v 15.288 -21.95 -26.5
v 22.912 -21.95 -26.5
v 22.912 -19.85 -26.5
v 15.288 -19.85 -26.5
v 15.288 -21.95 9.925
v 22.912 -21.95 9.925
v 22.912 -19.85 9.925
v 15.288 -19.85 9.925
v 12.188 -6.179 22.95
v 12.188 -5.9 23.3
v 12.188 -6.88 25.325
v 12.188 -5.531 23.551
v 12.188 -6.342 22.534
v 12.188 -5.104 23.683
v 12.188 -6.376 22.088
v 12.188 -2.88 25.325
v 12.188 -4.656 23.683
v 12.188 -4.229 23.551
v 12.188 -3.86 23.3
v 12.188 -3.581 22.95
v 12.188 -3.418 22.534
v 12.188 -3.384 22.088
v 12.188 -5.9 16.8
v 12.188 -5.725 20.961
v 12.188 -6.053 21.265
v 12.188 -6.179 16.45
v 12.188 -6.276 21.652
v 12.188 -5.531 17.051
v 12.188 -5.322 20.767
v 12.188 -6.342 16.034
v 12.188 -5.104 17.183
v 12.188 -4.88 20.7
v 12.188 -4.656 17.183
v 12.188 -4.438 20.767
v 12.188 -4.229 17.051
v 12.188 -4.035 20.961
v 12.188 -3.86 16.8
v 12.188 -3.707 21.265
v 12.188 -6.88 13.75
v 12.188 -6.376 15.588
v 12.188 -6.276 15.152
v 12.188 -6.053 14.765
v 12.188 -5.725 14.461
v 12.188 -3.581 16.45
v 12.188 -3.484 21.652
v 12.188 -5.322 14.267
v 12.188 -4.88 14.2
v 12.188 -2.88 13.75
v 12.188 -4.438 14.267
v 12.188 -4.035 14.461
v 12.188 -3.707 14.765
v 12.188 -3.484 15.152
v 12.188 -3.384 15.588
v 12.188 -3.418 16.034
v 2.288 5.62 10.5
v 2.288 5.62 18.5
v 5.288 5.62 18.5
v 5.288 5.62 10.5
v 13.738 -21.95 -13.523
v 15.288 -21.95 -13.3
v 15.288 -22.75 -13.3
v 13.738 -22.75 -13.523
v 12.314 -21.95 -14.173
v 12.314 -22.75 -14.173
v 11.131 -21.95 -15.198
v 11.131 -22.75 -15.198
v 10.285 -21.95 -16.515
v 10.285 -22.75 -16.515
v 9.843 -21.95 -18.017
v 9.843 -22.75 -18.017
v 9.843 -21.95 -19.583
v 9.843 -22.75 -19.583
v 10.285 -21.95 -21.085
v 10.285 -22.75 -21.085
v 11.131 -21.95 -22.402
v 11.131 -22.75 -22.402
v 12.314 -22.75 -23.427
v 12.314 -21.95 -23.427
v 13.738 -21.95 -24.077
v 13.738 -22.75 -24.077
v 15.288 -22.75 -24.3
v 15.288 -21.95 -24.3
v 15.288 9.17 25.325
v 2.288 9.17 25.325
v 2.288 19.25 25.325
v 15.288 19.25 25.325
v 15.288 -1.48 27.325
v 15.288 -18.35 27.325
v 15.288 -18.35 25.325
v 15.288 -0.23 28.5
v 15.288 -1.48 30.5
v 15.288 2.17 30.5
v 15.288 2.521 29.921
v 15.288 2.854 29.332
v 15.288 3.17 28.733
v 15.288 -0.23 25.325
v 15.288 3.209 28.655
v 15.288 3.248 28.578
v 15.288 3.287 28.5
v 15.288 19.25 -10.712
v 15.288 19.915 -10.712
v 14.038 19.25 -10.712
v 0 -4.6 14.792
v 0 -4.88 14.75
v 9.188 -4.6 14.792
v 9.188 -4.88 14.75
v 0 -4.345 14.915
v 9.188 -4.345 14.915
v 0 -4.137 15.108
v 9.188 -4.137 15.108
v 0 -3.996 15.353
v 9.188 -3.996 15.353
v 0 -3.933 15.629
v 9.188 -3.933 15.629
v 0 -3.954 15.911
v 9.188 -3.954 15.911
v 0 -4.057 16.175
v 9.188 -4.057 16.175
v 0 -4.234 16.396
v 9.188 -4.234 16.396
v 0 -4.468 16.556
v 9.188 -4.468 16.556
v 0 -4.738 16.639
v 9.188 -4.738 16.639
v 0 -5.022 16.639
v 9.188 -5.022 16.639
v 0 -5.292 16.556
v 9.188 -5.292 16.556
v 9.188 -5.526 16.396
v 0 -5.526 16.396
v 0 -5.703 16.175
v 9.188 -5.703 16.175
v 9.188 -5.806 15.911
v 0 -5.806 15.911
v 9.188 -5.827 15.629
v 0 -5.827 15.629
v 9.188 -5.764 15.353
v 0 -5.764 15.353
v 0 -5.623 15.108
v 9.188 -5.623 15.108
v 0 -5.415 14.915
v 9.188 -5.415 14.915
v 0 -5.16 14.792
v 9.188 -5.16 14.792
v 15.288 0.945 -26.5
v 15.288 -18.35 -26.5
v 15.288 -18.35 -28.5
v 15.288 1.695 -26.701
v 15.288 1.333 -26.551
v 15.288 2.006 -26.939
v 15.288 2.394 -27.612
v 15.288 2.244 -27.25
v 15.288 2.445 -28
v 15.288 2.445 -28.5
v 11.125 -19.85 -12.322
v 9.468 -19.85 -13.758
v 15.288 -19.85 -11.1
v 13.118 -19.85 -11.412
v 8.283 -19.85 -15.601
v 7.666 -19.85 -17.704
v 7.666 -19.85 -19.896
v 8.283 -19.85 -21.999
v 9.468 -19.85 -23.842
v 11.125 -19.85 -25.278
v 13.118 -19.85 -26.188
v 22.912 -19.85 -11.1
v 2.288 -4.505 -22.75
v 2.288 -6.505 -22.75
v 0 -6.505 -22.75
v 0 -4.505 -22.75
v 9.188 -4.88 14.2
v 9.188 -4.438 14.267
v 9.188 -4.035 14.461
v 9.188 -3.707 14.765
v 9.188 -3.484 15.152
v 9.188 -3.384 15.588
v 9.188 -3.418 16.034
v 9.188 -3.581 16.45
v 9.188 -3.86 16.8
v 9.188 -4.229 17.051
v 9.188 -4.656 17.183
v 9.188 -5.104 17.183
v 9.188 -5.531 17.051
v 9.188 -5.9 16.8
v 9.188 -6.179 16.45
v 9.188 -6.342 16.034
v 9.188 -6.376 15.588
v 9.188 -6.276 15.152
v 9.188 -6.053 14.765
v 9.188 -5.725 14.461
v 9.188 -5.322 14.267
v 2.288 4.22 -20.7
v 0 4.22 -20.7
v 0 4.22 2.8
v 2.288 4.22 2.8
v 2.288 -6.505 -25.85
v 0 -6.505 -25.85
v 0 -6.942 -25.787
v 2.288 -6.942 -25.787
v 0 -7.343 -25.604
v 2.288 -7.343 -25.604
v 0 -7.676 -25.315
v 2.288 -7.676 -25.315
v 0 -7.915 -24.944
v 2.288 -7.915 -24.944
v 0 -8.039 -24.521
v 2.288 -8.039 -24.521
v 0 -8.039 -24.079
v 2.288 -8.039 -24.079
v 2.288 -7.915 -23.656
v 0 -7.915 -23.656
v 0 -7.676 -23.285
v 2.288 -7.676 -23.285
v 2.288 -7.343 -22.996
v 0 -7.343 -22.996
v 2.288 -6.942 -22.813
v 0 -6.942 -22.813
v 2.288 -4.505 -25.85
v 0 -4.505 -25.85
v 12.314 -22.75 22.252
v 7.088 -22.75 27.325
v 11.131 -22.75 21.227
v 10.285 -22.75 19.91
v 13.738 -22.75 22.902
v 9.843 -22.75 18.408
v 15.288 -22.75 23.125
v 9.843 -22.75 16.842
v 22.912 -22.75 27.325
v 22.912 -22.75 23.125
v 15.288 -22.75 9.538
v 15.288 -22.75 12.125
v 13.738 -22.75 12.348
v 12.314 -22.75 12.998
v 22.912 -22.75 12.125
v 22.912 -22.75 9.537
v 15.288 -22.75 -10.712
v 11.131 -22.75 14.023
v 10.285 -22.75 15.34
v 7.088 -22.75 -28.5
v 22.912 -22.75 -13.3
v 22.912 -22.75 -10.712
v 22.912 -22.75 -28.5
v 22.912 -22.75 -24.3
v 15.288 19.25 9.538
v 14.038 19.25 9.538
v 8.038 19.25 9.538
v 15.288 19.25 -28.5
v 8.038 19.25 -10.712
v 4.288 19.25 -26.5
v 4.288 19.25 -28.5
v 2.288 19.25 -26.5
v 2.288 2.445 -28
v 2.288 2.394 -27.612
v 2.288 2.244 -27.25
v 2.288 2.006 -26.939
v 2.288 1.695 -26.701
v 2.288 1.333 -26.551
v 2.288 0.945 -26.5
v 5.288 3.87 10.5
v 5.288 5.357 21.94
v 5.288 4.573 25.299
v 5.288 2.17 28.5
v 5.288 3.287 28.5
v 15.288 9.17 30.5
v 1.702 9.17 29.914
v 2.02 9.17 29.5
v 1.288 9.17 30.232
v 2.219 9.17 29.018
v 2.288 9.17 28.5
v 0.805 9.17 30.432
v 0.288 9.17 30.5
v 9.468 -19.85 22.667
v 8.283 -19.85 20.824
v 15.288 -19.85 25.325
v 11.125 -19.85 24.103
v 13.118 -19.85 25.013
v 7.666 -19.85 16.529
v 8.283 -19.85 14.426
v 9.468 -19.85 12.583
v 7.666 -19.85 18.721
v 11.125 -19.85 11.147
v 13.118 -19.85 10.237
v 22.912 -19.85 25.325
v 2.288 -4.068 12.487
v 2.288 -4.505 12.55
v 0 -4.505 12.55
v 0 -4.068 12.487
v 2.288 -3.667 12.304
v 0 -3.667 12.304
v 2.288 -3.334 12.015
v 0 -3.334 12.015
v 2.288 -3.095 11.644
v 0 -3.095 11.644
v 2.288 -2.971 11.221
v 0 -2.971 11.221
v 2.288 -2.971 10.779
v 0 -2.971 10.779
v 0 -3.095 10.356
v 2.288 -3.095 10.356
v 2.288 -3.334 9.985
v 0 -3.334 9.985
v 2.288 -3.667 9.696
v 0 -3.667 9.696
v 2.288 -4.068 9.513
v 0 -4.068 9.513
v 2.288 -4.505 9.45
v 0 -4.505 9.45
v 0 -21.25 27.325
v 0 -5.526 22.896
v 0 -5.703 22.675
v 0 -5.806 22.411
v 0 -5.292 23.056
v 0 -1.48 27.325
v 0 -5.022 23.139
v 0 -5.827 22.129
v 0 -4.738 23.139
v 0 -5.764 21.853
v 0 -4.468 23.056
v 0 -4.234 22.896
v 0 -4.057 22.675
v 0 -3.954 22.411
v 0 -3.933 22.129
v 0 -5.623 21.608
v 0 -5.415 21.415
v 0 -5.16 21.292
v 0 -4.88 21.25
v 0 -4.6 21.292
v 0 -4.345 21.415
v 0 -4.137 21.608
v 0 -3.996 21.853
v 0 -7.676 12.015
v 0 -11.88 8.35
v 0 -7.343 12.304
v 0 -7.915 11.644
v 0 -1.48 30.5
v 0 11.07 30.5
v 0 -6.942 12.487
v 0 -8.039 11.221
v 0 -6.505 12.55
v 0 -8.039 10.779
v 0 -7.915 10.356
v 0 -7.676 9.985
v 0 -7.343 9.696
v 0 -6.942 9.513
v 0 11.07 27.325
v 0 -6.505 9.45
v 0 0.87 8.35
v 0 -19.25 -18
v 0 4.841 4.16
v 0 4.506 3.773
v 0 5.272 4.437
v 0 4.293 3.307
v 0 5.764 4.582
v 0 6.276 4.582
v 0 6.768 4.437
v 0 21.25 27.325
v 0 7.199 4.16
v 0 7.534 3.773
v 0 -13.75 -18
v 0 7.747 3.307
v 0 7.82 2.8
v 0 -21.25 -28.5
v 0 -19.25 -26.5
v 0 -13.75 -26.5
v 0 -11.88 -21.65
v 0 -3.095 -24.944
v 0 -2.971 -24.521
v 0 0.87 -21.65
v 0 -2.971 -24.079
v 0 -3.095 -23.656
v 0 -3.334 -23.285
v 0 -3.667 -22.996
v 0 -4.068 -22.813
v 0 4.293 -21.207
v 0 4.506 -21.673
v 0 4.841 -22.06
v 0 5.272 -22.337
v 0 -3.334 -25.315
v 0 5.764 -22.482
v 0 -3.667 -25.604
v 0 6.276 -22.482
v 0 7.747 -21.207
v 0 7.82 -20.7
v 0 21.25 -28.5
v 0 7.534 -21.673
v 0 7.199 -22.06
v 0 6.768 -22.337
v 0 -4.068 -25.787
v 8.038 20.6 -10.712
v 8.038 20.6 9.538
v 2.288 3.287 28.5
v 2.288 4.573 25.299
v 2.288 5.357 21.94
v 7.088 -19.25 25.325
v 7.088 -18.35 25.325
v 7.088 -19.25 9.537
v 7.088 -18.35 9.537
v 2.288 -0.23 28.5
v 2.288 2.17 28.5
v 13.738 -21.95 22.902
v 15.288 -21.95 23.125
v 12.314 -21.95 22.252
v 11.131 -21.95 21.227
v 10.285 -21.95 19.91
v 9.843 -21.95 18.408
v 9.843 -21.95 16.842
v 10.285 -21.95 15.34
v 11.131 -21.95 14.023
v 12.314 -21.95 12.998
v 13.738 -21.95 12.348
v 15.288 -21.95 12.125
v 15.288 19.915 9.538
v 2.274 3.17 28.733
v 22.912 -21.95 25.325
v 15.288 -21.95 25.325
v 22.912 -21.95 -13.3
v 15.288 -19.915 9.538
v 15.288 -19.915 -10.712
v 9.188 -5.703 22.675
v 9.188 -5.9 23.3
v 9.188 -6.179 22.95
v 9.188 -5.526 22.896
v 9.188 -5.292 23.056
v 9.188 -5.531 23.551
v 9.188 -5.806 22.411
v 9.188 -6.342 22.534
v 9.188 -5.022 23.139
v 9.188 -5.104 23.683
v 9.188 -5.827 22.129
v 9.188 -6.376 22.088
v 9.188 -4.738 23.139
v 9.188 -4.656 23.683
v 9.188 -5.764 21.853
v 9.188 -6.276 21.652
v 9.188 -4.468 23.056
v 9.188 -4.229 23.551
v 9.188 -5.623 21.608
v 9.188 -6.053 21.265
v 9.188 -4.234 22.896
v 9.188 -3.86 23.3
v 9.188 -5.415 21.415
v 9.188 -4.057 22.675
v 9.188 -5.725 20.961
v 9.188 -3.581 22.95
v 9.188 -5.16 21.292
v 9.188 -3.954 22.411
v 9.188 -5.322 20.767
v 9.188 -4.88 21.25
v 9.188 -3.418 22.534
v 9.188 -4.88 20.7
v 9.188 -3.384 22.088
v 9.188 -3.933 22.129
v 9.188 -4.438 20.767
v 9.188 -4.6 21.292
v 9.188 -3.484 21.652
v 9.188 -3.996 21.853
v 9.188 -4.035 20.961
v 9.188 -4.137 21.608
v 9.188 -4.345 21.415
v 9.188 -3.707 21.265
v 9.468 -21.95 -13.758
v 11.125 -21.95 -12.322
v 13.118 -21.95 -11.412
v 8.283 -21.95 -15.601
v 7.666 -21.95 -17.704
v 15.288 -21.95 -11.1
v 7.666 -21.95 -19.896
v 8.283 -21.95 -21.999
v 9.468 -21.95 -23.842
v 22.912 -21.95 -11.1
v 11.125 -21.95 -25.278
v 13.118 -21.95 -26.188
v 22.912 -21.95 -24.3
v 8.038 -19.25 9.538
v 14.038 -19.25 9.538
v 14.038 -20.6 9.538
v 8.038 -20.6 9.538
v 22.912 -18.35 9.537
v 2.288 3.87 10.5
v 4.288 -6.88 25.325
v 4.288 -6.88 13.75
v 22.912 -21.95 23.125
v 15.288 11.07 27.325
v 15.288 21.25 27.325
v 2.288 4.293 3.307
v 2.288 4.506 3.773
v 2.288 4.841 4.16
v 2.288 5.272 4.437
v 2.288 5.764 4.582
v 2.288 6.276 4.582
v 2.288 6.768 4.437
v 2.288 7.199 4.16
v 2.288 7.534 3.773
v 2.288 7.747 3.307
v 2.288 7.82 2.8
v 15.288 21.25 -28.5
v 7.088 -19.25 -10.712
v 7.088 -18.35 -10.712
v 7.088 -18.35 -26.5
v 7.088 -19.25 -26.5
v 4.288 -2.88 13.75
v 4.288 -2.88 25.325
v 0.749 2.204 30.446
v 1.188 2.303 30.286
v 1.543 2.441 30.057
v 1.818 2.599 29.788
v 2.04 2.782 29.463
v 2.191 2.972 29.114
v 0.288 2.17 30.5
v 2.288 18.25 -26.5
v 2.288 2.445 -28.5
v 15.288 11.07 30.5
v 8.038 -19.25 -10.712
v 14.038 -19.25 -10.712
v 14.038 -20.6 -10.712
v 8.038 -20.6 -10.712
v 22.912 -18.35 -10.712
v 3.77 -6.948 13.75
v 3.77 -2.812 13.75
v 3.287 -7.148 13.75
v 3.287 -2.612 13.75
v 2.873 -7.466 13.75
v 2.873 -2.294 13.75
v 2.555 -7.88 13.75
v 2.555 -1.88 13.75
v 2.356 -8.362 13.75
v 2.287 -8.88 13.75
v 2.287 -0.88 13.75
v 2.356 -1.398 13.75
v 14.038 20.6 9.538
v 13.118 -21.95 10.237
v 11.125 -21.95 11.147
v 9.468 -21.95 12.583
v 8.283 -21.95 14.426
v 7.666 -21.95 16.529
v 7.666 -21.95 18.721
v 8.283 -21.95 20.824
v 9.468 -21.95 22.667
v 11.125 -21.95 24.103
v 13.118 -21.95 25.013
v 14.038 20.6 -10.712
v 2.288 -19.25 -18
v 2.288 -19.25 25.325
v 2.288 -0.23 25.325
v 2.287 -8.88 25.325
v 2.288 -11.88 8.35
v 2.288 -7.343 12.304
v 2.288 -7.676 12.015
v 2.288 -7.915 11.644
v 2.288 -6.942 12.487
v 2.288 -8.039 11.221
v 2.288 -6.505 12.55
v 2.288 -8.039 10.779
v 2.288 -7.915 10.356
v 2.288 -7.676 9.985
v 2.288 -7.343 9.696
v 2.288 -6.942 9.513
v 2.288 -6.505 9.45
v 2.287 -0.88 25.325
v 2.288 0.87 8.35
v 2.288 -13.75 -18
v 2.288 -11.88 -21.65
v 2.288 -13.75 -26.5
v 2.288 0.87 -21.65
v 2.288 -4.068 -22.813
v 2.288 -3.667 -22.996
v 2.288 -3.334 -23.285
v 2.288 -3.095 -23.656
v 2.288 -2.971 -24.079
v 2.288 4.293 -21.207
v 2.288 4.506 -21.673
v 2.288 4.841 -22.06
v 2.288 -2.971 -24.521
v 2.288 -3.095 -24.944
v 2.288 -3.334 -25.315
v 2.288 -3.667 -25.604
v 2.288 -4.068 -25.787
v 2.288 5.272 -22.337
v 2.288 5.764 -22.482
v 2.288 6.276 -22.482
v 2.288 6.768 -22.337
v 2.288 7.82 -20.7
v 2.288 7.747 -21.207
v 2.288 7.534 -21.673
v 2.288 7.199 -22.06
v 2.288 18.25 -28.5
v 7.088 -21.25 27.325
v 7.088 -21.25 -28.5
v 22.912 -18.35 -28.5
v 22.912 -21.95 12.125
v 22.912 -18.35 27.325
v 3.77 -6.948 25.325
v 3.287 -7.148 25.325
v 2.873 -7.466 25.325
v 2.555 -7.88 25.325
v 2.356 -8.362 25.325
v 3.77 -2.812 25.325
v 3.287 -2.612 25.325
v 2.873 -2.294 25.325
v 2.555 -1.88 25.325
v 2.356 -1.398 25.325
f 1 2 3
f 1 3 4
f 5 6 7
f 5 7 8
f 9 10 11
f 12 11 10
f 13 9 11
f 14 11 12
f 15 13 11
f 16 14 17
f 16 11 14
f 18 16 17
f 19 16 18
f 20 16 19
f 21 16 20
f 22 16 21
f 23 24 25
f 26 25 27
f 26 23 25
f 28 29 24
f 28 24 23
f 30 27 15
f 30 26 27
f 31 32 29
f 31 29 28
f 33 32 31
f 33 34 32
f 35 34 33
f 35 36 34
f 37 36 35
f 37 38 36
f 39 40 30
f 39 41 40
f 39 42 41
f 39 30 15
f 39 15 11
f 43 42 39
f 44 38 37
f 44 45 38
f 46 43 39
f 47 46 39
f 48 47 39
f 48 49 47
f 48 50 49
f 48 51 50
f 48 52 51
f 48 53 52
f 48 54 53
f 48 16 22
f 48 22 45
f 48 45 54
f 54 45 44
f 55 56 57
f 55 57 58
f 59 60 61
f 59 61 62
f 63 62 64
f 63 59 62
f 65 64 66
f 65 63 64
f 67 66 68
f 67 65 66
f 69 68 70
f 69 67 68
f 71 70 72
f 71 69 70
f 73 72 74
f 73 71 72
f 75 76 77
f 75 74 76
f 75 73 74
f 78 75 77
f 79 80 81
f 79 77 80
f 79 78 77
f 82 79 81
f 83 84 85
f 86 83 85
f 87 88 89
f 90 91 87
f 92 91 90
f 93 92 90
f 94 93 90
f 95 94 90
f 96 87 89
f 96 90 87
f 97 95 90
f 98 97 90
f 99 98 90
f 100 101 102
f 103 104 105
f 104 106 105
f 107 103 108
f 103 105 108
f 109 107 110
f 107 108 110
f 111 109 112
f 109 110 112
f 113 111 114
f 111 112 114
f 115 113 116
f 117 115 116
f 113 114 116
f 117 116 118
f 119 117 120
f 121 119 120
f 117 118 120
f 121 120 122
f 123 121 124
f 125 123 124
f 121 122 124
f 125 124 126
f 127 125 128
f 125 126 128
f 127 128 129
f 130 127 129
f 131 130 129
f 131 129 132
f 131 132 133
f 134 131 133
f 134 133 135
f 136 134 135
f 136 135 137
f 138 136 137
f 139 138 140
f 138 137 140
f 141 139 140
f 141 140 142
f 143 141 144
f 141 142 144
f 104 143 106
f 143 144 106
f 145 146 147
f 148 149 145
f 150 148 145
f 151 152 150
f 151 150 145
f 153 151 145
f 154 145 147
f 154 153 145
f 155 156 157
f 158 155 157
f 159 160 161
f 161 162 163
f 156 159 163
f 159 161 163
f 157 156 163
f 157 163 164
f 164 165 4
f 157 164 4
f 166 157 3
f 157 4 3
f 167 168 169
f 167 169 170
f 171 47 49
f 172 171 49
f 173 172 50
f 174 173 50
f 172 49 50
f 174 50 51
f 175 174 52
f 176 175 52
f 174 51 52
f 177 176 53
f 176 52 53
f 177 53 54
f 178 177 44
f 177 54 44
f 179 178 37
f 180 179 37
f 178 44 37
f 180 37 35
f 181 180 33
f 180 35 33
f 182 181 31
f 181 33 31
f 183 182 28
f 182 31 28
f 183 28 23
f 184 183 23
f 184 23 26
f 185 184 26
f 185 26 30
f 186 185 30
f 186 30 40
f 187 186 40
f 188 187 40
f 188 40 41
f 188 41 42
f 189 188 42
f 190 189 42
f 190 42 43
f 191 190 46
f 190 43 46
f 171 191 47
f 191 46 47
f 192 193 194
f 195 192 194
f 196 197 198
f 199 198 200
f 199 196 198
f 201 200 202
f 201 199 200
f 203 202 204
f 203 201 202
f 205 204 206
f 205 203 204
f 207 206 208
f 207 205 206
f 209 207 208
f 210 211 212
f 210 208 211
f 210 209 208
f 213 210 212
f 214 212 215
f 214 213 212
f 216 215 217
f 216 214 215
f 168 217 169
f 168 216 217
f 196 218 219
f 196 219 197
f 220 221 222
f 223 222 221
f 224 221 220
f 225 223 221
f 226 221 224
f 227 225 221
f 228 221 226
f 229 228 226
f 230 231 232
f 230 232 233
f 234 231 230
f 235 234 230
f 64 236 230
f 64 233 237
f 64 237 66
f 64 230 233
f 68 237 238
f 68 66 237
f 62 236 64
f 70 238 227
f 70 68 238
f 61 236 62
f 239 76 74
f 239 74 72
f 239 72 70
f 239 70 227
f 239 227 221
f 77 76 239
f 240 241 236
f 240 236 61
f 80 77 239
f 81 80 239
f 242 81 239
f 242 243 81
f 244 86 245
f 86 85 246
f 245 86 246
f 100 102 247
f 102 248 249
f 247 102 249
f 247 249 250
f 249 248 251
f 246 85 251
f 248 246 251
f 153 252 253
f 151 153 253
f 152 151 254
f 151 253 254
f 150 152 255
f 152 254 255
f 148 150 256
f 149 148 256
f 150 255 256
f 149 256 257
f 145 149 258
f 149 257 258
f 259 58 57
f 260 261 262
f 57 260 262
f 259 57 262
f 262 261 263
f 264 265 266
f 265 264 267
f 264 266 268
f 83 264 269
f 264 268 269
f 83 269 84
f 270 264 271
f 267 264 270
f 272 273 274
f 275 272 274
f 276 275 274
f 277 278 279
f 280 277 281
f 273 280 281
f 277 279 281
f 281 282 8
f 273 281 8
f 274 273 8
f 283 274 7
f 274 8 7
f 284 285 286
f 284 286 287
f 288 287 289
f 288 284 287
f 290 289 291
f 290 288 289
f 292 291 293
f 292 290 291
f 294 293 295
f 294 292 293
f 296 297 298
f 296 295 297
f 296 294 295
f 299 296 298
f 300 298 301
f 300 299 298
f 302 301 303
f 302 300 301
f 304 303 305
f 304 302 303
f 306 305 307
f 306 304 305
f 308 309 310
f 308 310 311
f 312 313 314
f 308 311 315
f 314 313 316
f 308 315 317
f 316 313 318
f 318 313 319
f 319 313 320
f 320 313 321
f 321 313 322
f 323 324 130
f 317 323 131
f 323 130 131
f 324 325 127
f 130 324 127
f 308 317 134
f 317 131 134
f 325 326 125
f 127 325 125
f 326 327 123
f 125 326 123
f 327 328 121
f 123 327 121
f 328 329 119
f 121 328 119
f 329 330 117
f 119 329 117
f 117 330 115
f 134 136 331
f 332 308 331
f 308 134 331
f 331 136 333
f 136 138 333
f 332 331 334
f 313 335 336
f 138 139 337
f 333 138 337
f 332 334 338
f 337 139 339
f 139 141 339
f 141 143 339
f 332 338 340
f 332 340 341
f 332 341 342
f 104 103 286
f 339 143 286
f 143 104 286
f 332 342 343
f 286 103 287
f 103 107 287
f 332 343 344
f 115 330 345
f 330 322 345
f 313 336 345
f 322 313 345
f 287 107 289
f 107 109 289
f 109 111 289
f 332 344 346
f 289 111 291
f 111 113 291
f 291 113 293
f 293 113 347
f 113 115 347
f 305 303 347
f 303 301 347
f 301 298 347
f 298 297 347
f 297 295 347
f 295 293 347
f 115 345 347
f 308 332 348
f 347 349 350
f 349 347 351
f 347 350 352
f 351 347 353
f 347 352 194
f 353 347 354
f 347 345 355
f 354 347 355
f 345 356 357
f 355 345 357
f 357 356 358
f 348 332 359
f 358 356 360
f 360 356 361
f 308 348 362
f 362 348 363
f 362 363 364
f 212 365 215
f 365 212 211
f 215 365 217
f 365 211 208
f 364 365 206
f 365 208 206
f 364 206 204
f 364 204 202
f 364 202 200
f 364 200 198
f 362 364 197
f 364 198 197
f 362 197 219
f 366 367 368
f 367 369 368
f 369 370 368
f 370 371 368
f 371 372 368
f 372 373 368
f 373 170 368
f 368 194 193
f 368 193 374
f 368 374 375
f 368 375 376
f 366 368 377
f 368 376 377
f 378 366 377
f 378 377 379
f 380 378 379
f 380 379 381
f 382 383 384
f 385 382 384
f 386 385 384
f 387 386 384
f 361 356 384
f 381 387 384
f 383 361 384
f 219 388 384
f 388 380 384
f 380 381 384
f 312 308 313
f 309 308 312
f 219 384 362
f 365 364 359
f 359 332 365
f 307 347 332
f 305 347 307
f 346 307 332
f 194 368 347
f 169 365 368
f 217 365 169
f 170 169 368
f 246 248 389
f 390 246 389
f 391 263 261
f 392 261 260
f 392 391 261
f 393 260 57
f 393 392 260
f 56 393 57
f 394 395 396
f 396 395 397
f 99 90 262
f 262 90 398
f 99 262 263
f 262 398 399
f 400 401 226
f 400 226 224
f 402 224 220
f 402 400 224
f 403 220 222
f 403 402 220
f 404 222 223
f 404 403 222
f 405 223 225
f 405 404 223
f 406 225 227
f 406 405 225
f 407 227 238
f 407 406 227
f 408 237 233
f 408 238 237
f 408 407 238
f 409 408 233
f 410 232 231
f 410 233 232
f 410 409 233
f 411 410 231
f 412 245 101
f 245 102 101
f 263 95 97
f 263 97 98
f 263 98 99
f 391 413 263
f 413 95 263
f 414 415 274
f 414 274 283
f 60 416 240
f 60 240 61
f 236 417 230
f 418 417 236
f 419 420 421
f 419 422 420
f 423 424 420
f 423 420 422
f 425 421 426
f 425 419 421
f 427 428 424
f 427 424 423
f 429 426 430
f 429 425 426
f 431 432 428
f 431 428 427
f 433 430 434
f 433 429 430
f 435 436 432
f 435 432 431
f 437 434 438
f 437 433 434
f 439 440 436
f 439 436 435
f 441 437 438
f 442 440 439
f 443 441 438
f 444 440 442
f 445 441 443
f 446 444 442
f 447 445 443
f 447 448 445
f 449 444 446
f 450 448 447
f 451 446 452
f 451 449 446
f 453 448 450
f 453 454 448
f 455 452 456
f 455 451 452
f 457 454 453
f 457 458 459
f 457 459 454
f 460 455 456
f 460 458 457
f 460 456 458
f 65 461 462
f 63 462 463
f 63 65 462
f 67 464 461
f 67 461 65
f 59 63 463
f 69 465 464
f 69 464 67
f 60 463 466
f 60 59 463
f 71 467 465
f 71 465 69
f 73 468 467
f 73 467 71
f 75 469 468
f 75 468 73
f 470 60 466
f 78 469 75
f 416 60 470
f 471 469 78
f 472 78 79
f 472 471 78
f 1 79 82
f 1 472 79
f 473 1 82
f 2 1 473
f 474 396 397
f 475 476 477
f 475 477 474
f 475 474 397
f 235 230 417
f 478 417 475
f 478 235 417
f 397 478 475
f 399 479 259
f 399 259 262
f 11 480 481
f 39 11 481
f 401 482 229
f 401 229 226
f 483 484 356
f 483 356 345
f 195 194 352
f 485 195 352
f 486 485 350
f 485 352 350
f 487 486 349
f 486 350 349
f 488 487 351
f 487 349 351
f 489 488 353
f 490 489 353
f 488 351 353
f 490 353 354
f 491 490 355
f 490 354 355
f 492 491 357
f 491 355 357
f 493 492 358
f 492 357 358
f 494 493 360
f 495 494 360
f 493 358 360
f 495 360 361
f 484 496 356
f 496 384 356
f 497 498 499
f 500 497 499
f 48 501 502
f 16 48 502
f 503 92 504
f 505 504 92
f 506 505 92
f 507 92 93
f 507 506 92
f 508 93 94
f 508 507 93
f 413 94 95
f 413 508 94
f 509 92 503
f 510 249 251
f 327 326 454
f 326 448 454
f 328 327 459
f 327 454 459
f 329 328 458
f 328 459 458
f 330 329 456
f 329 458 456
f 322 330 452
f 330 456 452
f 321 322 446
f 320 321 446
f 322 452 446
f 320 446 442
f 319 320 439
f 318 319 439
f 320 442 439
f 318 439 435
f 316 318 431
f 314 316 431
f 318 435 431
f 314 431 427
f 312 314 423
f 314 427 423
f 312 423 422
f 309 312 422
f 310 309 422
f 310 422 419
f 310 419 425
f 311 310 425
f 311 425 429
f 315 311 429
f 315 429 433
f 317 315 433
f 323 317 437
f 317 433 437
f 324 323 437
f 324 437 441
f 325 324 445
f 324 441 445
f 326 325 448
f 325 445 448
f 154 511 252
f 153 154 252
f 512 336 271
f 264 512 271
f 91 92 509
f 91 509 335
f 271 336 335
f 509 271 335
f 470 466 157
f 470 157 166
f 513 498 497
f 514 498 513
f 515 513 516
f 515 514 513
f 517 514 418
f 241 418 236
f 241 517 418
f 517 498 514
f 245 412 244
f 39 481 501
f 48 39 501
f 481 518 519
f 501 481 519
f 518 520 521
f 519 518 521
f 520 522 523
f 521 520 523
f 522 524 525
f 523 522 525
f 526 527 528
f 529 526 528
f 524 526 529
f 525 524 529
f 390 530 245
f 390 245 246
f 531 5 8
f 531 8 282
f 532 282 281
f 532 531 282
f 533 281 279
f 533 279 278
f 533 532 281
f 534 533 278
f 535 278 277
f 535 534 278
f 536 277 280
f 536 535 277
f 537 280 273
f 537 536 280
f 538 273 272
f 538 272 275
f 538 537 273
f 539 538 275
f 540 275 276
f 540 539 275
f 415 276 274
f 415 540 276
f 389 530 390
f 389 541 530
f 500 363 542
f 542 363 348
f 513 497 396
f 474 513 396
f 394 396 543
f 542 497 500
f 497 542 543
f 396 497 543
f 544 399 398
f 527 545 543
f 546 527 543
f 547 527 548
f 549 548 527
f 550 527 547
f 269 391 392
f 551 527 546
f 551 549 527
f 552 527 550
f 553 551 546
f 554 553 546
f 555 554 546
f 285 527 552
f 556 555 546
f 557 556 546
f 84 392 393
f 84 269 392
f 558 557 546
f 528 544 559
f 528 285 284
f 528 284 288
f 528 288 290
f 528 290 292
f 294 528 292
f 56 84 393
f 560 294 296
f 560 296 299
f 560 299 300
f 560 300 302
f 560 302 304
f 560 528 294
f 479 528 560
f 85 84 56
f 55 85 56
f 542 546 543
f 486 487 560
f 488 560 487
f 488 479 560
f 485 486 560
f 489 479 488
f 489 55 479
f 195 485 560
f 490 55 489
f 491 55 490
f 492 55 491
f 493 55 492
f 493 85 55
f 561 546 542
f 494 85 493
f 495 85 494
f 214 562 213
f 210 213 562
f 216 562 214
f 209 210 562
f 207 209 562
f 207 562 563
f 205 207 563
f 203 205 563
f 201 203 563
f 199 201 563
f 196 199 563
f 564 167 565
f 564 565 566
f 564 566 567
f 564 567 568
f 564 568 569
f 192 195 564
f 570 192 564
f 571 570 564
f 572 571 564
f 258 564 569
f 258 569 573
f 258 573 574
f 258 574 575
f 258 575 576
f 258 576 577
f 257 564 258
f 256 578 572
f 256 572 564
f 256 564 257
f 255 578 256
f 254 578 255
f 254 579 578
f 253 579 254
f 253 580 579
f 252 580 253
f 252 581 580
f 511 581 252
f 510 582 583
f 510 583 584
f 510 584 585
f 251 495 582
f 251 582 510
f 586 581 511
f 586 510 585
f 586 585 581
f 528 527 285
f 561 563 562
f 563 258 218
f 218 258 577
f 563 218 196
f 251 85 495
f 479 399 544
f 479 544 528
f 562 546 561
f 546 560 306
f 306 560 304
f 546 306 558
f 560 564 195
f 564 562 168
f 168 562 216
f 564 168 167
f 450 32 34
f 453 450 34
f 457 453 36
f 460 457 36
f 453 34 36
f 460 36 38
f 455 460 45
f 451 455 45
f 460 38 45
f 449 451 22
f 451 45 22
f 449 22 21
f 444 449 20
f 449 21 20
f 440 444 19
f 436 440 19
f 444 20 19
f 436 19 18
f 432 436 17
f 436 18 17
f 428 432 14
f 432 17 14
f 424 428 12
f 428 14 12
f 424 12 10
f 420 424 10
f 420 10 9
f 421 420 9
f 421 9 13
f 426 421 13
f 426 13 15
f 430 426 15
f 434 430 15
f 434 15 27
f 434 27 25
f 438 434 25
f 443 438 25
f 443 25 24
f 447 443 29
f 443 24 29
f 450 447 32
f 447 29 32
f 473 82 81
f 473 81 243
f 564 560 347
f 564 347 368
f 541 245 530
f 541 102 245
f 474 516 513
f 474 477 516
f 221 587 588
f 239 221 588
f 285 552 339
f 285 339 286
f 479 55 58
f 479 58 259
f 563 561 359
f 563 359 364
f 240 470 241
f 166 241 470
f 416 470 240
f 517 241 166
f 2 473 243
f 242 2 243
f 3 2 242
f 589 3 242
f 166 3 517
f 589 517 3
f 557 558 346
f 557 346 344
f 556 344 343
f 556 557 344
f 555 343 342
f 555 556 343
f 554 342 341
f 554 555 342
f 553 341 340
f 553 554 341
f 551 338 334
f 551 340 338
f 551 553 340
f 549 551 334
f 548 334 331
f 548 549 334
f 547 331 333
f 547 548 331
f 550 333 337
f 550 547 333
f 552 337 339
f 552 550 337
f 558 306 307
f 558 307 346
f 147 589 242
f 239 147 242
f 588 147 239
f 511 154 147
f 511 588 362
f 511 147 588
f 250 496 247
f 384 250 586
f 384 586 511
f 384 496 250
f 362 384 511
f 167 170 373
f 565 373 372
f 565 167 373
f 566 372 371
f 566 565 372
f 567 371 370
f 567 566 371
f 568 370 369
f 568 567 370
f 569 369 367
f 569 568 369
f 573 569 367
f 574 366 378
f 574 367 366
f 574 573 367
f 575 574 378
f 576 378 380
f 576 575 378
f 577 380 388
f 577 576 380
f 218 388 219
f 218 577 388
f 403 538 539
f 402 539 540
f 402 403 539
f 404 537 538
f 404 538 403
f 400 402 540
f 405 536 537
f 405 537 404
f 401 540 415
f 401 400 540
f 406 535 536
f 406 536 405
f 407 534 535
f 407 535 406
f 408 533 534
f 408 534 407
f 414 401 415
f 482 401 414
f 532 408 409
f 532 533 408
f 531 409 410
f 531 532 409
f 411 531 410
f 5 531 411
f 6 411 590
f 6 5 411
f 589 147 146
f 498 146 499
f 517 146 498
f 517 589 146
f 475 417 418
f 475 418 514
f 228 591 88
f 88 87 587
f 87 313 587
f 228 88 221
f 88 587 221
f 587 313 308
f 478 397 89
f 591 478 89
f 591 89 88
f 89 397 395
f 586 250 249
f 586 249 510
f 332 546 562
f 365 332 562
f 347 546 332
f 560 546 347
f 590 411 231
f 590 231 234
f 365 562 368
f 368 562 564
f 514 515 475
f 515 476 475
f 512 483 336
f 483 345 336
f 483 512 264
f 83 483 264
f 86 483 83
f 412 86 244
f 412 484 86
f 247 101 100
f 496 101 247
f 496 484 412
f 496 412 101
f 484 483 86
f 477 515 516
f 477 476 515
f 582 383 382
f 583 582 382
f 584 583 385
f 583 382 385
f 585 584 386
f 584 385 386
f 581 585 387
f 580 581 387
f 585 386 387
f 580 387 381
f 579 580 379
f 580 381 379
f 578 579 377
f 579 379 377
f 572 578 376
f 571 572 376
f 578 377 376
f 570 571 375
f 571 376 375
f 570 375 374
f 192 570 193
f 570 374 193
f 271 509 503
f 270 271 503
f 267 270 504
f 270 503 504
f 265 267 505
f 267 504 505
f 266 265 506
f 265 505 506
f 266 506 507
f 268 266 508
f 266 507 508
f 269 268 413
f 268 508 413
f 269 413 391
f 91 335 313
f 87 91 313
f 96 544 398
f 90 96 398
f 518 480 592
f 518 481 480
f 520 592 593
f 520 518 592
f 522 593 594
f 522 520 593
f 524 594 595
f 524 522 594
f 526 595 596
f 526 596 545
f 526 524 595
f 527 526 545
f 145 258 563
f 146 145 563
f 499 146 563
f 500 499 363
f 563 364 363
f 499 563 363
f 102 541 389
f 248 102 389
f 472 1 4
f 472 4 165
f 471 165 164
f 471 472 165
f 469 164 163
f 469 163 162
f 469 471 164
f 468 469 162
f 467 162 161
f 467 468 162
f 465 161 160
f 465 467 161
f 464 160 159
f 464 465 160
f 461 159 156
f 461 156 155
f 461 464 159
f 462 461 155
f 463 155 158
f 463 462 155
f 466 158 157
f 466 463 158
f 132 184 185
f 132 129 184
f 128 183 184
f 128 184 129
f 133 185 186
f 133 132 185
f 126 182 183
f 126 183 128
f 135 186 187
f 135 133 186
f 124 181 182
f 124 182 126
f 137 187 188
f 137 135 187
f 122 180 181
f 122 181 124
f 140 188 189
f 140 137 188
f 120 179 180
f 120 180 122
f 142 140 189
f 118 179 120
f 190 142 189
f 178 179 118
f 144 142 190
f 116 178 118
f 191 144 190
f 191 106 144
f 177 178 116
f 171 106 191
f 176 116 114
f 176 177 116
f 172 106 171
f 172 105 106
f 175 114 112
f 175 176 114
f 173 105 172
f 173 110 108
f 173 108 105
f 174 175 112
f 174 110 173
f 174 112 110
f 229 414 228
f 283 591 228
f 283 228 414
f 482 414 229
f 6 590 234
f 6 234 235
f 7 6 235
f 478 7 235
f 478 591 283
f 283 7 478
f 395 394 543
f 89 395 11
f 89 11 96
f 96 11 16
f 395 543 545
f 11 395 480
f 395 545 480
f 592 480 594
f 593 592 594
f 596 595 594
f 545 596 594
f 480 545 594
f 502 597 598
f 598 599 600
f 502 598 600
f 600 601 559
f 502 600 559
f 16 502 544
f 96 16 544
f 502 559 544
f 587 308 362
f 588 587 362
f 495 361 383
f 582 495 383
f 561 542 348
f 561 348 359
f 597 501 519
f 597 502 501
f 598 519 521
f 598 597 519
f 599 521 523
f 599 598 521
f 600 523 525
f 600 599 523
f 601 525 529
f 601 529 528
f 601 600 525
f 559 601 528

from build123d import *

# Parameters (mm, degrees)
MAIN_EXTRUDE_DEPTH            = 2.2875
WALLS_START                   = 2.2875
WALLS_DEPTH                   = 13
CORNER_SUPPORT_DEPTH          = 2
SKETCH2_R                     = 0.95
SKETCH2_W                     = 2.4
SKETCH2_H                     = 4
SKETCH2_W_2                   = 1
SWITCH_SPACER_DEPTH           = 9.9
ARM_SUPPORT_EXTRUDE_DEPTH     = 3
ARM_SUPPORT_CURVE_DEPTH       = 40.380356778
FILLET4_R                     = 2
FILLET3_R                     = 2
SKETCH2_5_R                   = 0.95
SWITCH_MOUNT_HOLES_DEPTH      = 40.380356889
SWITCH_MOUNT_HOLES_DEPTH_BACK = 40.380356889
SKETCH35_R                    = 1.5
SWITCH_MOUNT_EXIT_HOLES_DEPTH = 3
SKETCH4_W                     = 8.5
SKETCH4_H                     = 5.5
WIRE_HOLE_DEPTH               = 40.380356889
SKETCH25_W                    = 6
SKETCH25_H                    = 1.35
FEMALE_SNAP_DEPTH             = 10.125
SKETCH5_W                     = 30
SKETCH5_H                     = 12.75
SERVO_HOLE_DEPTH              = 40.380356889
SKETCH30_W                    = 15.7875
SKETCH30_H                    = 0.9
SKETCH30_W_2                  = 17.7875
SKETCH30_H_2                  = 1.5
MAGNET_EXTRUDE_1_DEPTH        = 7.625
MAGNET_EXTRUDE_1_DEPTH_BACK   = 8.2
SKETCH30_5_W                  = 20.25
SKETCH30_5_H                  = 1.5
MAGNET_EXTRUDE_2_DEPTH        = 8.2
SKETCH29_R                    = 7.7
MAGNET_HOLE_DEPTH             = 2.1
SKETCH31_R                    = 5.5
MAGNET_THRU_HOLE_DEPTH        = 58.632218961


with BuildPart() as part:
    # Sketch1 → Main Extrude (new body)
    with BuildSketch(Plane(origin=(0, 0, 0), x_dir=(0, 0, -1), z_dir=(1, 0, 0))):
        Polygon((-30.5, -1.48), (-27.325, -1.48), (-27.325, -21.25), (28.5, -21.25), (28.5, 21.25), (-27.325, 21.25), (-27.325, 11.07), (-30.5, 11.07), align=None)
        with BuildLine():
            Line((20.7, 4.22), (-2.8, 4.22))
            ThreePointArc((-2.8, 4.22), (-4.6, 6.02), (-2.8, 7.82))
            Line((-2.8, 7.82), (20.7, 7.82))
            ThreePointArc((20.7, 7.82), (22.5, 6.02), (20.7, 4.22))
        make_face(mode=Mode.SUBTRACT)
    extrude(amount=MAIN_EXTRUDE_DEPTH)

    # Sketch1_3 → Walls (add)
    with BuildSketch(Plane(origin=(0, 0, 0), x_dir=(0, 0, -1), z_dir=(1, 0, 0)).offset(WALLS_START)):
        Polygon((-25.325, 19.25), (28.5, 19.25), (28.5, 21.25), (-27.325, 21.25), (-27.325, 11.07), (-30.5, 11.07), (-30.5, 9.17), (-25.325, 9.17), align=None)
        with BuildLine():
            Line((28.5, 2.445), (28, 2.445))
            ThreePointArc((28, 2.445), (26.939339828, 2.005660172), (26.5, 0.945))
            Line((26.5, 0.945), (26.5, -19.25))
            Line((26.5, -19.25), (-25.325, -19.25))
            Line((-25.325, -19.25), (-25.325, -0.23))
            Line((-25.325, -0.23), (-28.5, -0.23))
            Line((-28.5, -0.23), (-28.5, 3.42))
            Line((-28.5, 3.42), (-30.5, 3.42))
            Line((-30.5, 3.42), (-30.5, -1.48))
            Line((-30.5, -1.48), (-27.325, -1.48))
            Line((-27.325, -1.48), (-27.325, -21.25))
            Line((-27.325, -21.25), (28.5, -21.25))
            Line((28.5, -21.25), (28.5, 2.445))
        make_face()
    extrude(amount=WALLS_DEPTH)

    # Sketch22 → Corner Support (add)
    with BuildSketch(Plane(origin=(0, 0, -28.5), x_dir=(-1, 0, 0), z_dir=(0, 0, -1))):
        Polygon((-4.2875, 19.25), (-2.2875, 18.25), (-2.2875, 19.25), align=None)
    extrude(amount=-CORNER_SUPPORT_DEPTH)

    # Sketch2 → Switch Spacer (add)
    with BuildSketch(Plane(origin=(2.2875, 0, 0), x_dir=(0, 0, -1), z_dir=(1, 0, 0))):
        Polygon((-14.75, -2.88), (-17.75, -2.88), (-17.75, -6.88), (-14.75, -6.88), (-14.75, -4.88), align=None)
        with Locations((-15.7, -4.88)):
            Circle(SKETCH2_R, mode=Mode.SUBTRACT)
        with Locations((-15.7, -4.88)):
            Circle(SKETCH2_R)
        Polygon((-20.15, -2.88), (-23.15, -2.88), (-23.15, -4.88), (-23.15, -6.88), (-20.15, -6.88), align=None)
        with BuildLine():
            ThreePointArc((-21.25, -4.88), (-22.2, -5.83), (-23.15, -4.88))
            ThreePointArc((-23.15, -4.88), (-22.2, -3.93), (-21.25, -4.88))
        make_face(mode=Mode.SUBTRACT)
        with Locations((-22.2, -4.88)):
            Circle(SKETCH2_R)
        Polygon((-23.15, -4.88), (-23.15, -2.88), (-25.325, -2.88), (-25.325, -6.88), (-23.15, -6.88), align=None)
        with Locations((-18.95, -4.88)):
            Rectangle(SKETCH2_W, SKETCH2_H)
        with Locations((-14.25, -4.88)):
            Rectangle(SKETCH2_W_2, SKETCH2_H)
    extrude(amount=SWITCH_SPACER_DEPTH)

    # Sketch3 → Arm Support Extrude (add)
    with BuildSketch(Plane(origin=(2.2875, 0, 0), x_dir=(0, 0, -1), z_dir=(1, 0, 0))):
        with BuildLine():
            Line((-18.5, 5.62), (-10.5, 5.62))
            Line((-10.5, 5.62), (-10.5, 3.87))
            Line((-10.5, 3.87), (-28.5, 2.17))
            Line((-28.5, 2.17), (-30.5, 2.17))
            ThreePointArc((-30.5, 2.17), (-24.743046131, 4.740377849), (-18.5, 5.62))
        make_face()
    extrude(amount=ARM_SUPPORT_EXTRUDE_DEPTH)

    # Sketch7 → Arm Support Curve (cut, through all)
    with BuildSketch(Plane(origin=(2.2875, 0, 0), x_dir=(0, 0, -1), z_dir=(1, 0, 0))):
        with BuildLine():
            Line((-28.5, 3.286589176), (-28.5, 3.42))
            Line((-28.5, 3.42), (-30.5, 3.42))
            Line((-30.5, 3.42), (-30.5, 2.17))
            ThreePointArc((-30.5, 2.17), (-29.627655409, 2.689861102), (-28.73283292, 3.17))
            ThreePointArc((-28.73283292, 3.17), (-28.616584416, 3.228630003), (-28.5, 3.286589176))
        make_face()
    extrude(amount=ARM_SUPPORT_CURVE_DEPTH, mode=Mode.SUBTRACT)

    # Fillet4
    fillet4_edges = [part.edges().sort_by_distance(p)[0] for p in [
        (2.2875, 5.67, 30.5),
    ]]
    fillet(fillet4_edges, radius=FILLET4_R)

    # Fillet3
    fillet3_edges = [part.edges().sort_by_distance(p)[0] for p in [
        (2.2875, -6.88, 19.5375),
        (2.2875, -2.88, 19.5375),
    ]]
    fillet(fillet3_edges, radius=FILLET3_R)

    # Sketch2_5 → Switch Mount Holes (cut, two sides)
    with BuildSketch(Plane(origin=(2.2875, 0, 0), x_dir=(0, 0, -1), z_dir=(1, 0, 0))) as switch_mount_holes_sk:
        with Locations((-22.2, -4.88)):
            Circle(SKETCH2_5_R)
        with Locations((-15.7, -4.88)):
            Circle(SKETCH2_5_R)
    extrude(amount=SWITCH_MOUNT_HOLES_DEPTH, mode=Mode.SUBTRACT)
    extrude(switch_mount_holes_sk.sketch, amount=-SWITCH_MOUNT_HOLES_DEPTH_BACK, mode=Mode.SUBTRACT)

    # Sketch35 → Switch Mount Exit Holes (cut)
    with BuildSketch(Plane(origin=(12.1875, 0, 0), x_dir=(0, 0, -1), z_dir=(1, 0, 0))):
        with Locations((-22.2, -4.88)):
            Circle(SKETCH35_R)
        with Locations((-15.7, -4.88)):
            Circle(SKETCH35_R)
    extrude(amount=-SWITCH_MOUNT_EXIT_HOLES_DEPTH, mode=Mode.SUBTRACT)

    # Sketch4 → Wire Hole (cut, through all)
    with BuildSketch(Plane(origin=(2.2875, 0, 0), x_dir=(0, 0, -1), z_dir=(1, 0, 0))):
        with Locations((22.25, -16.5)):
            Rectangle(SKETCH4_W, SKETCH4_H)
    extrude(amount=-WIRE_HOLE_DEPTH, mode=Mode.SUBTRACT)

    # Sketch25 → Female Snap (cut, symmetric)
    with BuildSketch(Plane(origin=(0, 0, -0.5875), x_dir=(-1, 0, 0), z_dir=(0, 0, -1))):
        with Locations((-11.0375, -19.925)):
            Rectangle(SKETCH25_W, SKETCH25_H)
        Polygon((-15.2875, -19.25), (-15.2875, -19.91463679), (-14.0375, -19.25), align=None)
        with Locations((-11.0375, 19.925)):
            Rectangle(SKETCH25_W, SKETCH25_H)
        Polygon((-15.2875, 19.91463679), (-15.2875, 19.25), (-14.0375, 19.25), align=None)
    extrude(amount=FEMALE_SNAP_DEPTH, both=True, mode=Mode.SUBTRACT)

    # Sketch5 → Servo Hole (cut, through all)
    with BuildSketch(Plane(origin=(2.2875, 0, 0), x_dir=(0, 0, -1), z_dir=(1, 0, 0))):
        with Locations((6.65, -5.505)):
            Rectangle(SKETCH5_W, SKETCH5_H)
        with BuildLine():
            Line((-9.45, -4.505), (-9.45, -6.505))
            ThreePointArc((-9.45, -6.505), (-11, -8.055), (-12.55, -6.505))
            Line((-12.55, -6.505), (-12.55, -4.505))
            ThreePointArc((-12.55, -4.505), (-11, -2.955), (-9.45, -4.505))
        make_face()
        with BuildLine():
            Line((25.85, -4.505), (25.85, -6.505))
            ThreePointArc((25.85, -6.505), (24.3, -8.055), (22.75, -6.505))
            Line((22.75, -6.505), (22.75, -4.505))
            ThreePointArc((22.75, -4.505), (24.3, -2.955), (25.85, -4.505))
        make_face()
    extrude(amount=-SERVO_HOLE_DEPTH, mode=Mode.SUBTRACT)

    # Sketch30 → Magnet Extrude 1 (add, two sides)
    with BuildSketch(Plane(origin=(15.2875, 0, 0), x_dir=(0, 0, -1), z_dir=(1, 0, 0))) as magnet_extrude_1_sk:
        Polygon((-27.325, -18.35), (-27.325, -21.25), (-9.5375, -21.25), (-9.5375, -19.91463679), (-9.5375, -19.25), (-25.325, -19.25), (-25.325, -18.35), align=None)
        with Locations((-17.43125, -18.8)):
            Rectangle(SKETCH30_W, SKETCH30_H)
        with Locations((19.60625, -22)):
            Rectangle(SKETCH30_W_2, SKETCH30_H_2)
        Polygon((10.7125, -19.91463679), (10.7125, -21.25), (28.5, -21.25), (28.5, -18.35), (26.5, -18.35), (26.5, -19.25), (10.7125, -19.25), align=None)
        with Locations((-18.43125, -22)):
            Rectangle(SKETCH30_W_2, SKETCH30_H_2)
        with Locations((18.60625, -18.8)):
            Rectangle(SKETCH30_W, SKETCH30_H)
    extrude(amount=MAGNET_EXTRUDE_1_DEPTH)
    extrude(magnet_extrude_1_sk.sketch, amount=-MAGNET_EXTRUDE_1_DEPTH_BACK)

    # Sketch30_5 → Magnet Extrude 2 (add)
    with BuildSketch(Plane(origin=(15.2875, 0, 0), x_dir=(0, 0, -1), z_dir=(1, 0, 0))):
        with Locations((0.5875, -22)):
            Rectangle(SKETCH30_5_W, SKETCH30_5_H)
    extrude(amount=-MAGNET_EXTRUDE_2_DEPTH)

    # Sketch29 → Magnet Hole (cut)
    with BuildSketch(Plane(origin=(0, -21.95, 0), x_dir=(1, 0, 0), z_dir=(0, 1, 0))):
        with Locations((15.2875, -17.625)):
            Circle(SKETCH29_R)
        with BuildLine():
            ThreePointArc((22.9125, -18.697089082), (20.338980677, -23.436414885), (15.2875, -25.325))
            Line((15.2875, -25.325), (22.9125, -25.325))
            Line((22.9125, -25.325), (22.9125, -18.697089082))
        make_face()
        with BuildLine():
            Line((22.9125, -9.925), (15.2875, -9.925))
            ThreePointArc((15.2875, -9.925), (20.338980677, -11.813585115), (22.9125, -16.552910918))
            Line((22.9125, -16.552910918), (22.9125, -9.925))
        make_face()
        with Locations((15.2875, 18.8)):
            Circle(SKETCH29_R)
        with BuildLine():
            ThreePointArc((22.9125, 17.727910918), (20.338980677, 12.988585115), (15.2875, 11.1))
            Line((15.2875, 11.1), (22.9125, 11.1))
            Line((22.9125, 11.1), (22.9125, 17.727910918))
        make_face()
        with BuildLine():
            Line((22.9125, 26.5), (15.2875, 26.5))
            ThreePointArc((15.2875, 26.5), (20.338980677, 24.611414885), (22.9125, 19.872089082))
            Line((22.9125, 19.872089082), (22.9125, 26.5))
        make_face()
        with BuildLine():
            ThreePointArc((22.9875, -17.625), (22.968727116, -17.087645368), (22.9125, -16.552910918))
            Line((22.9125, -16.552910918), (22.9125, -18.697089082))
            ThreePointArc((22.9125, -18.697089082), (22.968727116, -18.162354632), (22.9875, -17.625))
        make_face()
        with BuildLine():
            Line((22.9125, 19.872089082), (22.9125, 17.727910918))
            ThreePointArc((22.9125, 17.727910918), (22.968727116, 18.262645368), (22.9875, 18.8))
            ThreePointArc((22.9875, 18.8), (22.968727116, 19.337354632), (22.9125, 19.872089082))
        make_face()
    extrude(amount=MAGNET_HOLE_DEPTH, mode=Mode.SUBTRACT)

    # Sketch31 → Magnet Thru Hole (cut, through all)
    with BuildSketch(Plane.XZ.offset(21.95)):
        with Locations((15.2875, 17.625)):
            Circle(SKETCH31_R)
        with BuildLine():
            Line((22.9125, 23.125), (15.2875, 23.125))
            ThreePointArc((15.2875, 23.125), (19.176587297, 21.514087297), (20.7875, 17.625))
            ThreePointArc((20.7875, 17.625), (19.176587297, 13.735912703), (15.2875, 12.125))
            Line((15.2875, 12.125), (22.9125, 12.125))
            Line((22.9125, 12.125), (22.9125, 23.125))
        make_face()
        with Locations((15.2875, -18.8)):
            Circle(SKETCH31_R)
        with BuildLine():
            Line((22.9125, -13.3), (15.2875, -13.3))
            ThreePointArc((15.2875, -13.3), (19.176587297, -14.910912703), (20.7875, -18.8))
            ThreePointArc((20.7875, -18.8), (19.176587297, -22.689087297), (15.2875, -24.3))
            Line((15.2875, -24.3), (22.9125, -24.3))
            Line((22.9125, -24.3), (22.9125, -13.3))
        make_face()
    extrude(amount=MAGNET_THRU_HOLE_DEPTH, mode=Mode.SUBTRACT)


solid = part.part
